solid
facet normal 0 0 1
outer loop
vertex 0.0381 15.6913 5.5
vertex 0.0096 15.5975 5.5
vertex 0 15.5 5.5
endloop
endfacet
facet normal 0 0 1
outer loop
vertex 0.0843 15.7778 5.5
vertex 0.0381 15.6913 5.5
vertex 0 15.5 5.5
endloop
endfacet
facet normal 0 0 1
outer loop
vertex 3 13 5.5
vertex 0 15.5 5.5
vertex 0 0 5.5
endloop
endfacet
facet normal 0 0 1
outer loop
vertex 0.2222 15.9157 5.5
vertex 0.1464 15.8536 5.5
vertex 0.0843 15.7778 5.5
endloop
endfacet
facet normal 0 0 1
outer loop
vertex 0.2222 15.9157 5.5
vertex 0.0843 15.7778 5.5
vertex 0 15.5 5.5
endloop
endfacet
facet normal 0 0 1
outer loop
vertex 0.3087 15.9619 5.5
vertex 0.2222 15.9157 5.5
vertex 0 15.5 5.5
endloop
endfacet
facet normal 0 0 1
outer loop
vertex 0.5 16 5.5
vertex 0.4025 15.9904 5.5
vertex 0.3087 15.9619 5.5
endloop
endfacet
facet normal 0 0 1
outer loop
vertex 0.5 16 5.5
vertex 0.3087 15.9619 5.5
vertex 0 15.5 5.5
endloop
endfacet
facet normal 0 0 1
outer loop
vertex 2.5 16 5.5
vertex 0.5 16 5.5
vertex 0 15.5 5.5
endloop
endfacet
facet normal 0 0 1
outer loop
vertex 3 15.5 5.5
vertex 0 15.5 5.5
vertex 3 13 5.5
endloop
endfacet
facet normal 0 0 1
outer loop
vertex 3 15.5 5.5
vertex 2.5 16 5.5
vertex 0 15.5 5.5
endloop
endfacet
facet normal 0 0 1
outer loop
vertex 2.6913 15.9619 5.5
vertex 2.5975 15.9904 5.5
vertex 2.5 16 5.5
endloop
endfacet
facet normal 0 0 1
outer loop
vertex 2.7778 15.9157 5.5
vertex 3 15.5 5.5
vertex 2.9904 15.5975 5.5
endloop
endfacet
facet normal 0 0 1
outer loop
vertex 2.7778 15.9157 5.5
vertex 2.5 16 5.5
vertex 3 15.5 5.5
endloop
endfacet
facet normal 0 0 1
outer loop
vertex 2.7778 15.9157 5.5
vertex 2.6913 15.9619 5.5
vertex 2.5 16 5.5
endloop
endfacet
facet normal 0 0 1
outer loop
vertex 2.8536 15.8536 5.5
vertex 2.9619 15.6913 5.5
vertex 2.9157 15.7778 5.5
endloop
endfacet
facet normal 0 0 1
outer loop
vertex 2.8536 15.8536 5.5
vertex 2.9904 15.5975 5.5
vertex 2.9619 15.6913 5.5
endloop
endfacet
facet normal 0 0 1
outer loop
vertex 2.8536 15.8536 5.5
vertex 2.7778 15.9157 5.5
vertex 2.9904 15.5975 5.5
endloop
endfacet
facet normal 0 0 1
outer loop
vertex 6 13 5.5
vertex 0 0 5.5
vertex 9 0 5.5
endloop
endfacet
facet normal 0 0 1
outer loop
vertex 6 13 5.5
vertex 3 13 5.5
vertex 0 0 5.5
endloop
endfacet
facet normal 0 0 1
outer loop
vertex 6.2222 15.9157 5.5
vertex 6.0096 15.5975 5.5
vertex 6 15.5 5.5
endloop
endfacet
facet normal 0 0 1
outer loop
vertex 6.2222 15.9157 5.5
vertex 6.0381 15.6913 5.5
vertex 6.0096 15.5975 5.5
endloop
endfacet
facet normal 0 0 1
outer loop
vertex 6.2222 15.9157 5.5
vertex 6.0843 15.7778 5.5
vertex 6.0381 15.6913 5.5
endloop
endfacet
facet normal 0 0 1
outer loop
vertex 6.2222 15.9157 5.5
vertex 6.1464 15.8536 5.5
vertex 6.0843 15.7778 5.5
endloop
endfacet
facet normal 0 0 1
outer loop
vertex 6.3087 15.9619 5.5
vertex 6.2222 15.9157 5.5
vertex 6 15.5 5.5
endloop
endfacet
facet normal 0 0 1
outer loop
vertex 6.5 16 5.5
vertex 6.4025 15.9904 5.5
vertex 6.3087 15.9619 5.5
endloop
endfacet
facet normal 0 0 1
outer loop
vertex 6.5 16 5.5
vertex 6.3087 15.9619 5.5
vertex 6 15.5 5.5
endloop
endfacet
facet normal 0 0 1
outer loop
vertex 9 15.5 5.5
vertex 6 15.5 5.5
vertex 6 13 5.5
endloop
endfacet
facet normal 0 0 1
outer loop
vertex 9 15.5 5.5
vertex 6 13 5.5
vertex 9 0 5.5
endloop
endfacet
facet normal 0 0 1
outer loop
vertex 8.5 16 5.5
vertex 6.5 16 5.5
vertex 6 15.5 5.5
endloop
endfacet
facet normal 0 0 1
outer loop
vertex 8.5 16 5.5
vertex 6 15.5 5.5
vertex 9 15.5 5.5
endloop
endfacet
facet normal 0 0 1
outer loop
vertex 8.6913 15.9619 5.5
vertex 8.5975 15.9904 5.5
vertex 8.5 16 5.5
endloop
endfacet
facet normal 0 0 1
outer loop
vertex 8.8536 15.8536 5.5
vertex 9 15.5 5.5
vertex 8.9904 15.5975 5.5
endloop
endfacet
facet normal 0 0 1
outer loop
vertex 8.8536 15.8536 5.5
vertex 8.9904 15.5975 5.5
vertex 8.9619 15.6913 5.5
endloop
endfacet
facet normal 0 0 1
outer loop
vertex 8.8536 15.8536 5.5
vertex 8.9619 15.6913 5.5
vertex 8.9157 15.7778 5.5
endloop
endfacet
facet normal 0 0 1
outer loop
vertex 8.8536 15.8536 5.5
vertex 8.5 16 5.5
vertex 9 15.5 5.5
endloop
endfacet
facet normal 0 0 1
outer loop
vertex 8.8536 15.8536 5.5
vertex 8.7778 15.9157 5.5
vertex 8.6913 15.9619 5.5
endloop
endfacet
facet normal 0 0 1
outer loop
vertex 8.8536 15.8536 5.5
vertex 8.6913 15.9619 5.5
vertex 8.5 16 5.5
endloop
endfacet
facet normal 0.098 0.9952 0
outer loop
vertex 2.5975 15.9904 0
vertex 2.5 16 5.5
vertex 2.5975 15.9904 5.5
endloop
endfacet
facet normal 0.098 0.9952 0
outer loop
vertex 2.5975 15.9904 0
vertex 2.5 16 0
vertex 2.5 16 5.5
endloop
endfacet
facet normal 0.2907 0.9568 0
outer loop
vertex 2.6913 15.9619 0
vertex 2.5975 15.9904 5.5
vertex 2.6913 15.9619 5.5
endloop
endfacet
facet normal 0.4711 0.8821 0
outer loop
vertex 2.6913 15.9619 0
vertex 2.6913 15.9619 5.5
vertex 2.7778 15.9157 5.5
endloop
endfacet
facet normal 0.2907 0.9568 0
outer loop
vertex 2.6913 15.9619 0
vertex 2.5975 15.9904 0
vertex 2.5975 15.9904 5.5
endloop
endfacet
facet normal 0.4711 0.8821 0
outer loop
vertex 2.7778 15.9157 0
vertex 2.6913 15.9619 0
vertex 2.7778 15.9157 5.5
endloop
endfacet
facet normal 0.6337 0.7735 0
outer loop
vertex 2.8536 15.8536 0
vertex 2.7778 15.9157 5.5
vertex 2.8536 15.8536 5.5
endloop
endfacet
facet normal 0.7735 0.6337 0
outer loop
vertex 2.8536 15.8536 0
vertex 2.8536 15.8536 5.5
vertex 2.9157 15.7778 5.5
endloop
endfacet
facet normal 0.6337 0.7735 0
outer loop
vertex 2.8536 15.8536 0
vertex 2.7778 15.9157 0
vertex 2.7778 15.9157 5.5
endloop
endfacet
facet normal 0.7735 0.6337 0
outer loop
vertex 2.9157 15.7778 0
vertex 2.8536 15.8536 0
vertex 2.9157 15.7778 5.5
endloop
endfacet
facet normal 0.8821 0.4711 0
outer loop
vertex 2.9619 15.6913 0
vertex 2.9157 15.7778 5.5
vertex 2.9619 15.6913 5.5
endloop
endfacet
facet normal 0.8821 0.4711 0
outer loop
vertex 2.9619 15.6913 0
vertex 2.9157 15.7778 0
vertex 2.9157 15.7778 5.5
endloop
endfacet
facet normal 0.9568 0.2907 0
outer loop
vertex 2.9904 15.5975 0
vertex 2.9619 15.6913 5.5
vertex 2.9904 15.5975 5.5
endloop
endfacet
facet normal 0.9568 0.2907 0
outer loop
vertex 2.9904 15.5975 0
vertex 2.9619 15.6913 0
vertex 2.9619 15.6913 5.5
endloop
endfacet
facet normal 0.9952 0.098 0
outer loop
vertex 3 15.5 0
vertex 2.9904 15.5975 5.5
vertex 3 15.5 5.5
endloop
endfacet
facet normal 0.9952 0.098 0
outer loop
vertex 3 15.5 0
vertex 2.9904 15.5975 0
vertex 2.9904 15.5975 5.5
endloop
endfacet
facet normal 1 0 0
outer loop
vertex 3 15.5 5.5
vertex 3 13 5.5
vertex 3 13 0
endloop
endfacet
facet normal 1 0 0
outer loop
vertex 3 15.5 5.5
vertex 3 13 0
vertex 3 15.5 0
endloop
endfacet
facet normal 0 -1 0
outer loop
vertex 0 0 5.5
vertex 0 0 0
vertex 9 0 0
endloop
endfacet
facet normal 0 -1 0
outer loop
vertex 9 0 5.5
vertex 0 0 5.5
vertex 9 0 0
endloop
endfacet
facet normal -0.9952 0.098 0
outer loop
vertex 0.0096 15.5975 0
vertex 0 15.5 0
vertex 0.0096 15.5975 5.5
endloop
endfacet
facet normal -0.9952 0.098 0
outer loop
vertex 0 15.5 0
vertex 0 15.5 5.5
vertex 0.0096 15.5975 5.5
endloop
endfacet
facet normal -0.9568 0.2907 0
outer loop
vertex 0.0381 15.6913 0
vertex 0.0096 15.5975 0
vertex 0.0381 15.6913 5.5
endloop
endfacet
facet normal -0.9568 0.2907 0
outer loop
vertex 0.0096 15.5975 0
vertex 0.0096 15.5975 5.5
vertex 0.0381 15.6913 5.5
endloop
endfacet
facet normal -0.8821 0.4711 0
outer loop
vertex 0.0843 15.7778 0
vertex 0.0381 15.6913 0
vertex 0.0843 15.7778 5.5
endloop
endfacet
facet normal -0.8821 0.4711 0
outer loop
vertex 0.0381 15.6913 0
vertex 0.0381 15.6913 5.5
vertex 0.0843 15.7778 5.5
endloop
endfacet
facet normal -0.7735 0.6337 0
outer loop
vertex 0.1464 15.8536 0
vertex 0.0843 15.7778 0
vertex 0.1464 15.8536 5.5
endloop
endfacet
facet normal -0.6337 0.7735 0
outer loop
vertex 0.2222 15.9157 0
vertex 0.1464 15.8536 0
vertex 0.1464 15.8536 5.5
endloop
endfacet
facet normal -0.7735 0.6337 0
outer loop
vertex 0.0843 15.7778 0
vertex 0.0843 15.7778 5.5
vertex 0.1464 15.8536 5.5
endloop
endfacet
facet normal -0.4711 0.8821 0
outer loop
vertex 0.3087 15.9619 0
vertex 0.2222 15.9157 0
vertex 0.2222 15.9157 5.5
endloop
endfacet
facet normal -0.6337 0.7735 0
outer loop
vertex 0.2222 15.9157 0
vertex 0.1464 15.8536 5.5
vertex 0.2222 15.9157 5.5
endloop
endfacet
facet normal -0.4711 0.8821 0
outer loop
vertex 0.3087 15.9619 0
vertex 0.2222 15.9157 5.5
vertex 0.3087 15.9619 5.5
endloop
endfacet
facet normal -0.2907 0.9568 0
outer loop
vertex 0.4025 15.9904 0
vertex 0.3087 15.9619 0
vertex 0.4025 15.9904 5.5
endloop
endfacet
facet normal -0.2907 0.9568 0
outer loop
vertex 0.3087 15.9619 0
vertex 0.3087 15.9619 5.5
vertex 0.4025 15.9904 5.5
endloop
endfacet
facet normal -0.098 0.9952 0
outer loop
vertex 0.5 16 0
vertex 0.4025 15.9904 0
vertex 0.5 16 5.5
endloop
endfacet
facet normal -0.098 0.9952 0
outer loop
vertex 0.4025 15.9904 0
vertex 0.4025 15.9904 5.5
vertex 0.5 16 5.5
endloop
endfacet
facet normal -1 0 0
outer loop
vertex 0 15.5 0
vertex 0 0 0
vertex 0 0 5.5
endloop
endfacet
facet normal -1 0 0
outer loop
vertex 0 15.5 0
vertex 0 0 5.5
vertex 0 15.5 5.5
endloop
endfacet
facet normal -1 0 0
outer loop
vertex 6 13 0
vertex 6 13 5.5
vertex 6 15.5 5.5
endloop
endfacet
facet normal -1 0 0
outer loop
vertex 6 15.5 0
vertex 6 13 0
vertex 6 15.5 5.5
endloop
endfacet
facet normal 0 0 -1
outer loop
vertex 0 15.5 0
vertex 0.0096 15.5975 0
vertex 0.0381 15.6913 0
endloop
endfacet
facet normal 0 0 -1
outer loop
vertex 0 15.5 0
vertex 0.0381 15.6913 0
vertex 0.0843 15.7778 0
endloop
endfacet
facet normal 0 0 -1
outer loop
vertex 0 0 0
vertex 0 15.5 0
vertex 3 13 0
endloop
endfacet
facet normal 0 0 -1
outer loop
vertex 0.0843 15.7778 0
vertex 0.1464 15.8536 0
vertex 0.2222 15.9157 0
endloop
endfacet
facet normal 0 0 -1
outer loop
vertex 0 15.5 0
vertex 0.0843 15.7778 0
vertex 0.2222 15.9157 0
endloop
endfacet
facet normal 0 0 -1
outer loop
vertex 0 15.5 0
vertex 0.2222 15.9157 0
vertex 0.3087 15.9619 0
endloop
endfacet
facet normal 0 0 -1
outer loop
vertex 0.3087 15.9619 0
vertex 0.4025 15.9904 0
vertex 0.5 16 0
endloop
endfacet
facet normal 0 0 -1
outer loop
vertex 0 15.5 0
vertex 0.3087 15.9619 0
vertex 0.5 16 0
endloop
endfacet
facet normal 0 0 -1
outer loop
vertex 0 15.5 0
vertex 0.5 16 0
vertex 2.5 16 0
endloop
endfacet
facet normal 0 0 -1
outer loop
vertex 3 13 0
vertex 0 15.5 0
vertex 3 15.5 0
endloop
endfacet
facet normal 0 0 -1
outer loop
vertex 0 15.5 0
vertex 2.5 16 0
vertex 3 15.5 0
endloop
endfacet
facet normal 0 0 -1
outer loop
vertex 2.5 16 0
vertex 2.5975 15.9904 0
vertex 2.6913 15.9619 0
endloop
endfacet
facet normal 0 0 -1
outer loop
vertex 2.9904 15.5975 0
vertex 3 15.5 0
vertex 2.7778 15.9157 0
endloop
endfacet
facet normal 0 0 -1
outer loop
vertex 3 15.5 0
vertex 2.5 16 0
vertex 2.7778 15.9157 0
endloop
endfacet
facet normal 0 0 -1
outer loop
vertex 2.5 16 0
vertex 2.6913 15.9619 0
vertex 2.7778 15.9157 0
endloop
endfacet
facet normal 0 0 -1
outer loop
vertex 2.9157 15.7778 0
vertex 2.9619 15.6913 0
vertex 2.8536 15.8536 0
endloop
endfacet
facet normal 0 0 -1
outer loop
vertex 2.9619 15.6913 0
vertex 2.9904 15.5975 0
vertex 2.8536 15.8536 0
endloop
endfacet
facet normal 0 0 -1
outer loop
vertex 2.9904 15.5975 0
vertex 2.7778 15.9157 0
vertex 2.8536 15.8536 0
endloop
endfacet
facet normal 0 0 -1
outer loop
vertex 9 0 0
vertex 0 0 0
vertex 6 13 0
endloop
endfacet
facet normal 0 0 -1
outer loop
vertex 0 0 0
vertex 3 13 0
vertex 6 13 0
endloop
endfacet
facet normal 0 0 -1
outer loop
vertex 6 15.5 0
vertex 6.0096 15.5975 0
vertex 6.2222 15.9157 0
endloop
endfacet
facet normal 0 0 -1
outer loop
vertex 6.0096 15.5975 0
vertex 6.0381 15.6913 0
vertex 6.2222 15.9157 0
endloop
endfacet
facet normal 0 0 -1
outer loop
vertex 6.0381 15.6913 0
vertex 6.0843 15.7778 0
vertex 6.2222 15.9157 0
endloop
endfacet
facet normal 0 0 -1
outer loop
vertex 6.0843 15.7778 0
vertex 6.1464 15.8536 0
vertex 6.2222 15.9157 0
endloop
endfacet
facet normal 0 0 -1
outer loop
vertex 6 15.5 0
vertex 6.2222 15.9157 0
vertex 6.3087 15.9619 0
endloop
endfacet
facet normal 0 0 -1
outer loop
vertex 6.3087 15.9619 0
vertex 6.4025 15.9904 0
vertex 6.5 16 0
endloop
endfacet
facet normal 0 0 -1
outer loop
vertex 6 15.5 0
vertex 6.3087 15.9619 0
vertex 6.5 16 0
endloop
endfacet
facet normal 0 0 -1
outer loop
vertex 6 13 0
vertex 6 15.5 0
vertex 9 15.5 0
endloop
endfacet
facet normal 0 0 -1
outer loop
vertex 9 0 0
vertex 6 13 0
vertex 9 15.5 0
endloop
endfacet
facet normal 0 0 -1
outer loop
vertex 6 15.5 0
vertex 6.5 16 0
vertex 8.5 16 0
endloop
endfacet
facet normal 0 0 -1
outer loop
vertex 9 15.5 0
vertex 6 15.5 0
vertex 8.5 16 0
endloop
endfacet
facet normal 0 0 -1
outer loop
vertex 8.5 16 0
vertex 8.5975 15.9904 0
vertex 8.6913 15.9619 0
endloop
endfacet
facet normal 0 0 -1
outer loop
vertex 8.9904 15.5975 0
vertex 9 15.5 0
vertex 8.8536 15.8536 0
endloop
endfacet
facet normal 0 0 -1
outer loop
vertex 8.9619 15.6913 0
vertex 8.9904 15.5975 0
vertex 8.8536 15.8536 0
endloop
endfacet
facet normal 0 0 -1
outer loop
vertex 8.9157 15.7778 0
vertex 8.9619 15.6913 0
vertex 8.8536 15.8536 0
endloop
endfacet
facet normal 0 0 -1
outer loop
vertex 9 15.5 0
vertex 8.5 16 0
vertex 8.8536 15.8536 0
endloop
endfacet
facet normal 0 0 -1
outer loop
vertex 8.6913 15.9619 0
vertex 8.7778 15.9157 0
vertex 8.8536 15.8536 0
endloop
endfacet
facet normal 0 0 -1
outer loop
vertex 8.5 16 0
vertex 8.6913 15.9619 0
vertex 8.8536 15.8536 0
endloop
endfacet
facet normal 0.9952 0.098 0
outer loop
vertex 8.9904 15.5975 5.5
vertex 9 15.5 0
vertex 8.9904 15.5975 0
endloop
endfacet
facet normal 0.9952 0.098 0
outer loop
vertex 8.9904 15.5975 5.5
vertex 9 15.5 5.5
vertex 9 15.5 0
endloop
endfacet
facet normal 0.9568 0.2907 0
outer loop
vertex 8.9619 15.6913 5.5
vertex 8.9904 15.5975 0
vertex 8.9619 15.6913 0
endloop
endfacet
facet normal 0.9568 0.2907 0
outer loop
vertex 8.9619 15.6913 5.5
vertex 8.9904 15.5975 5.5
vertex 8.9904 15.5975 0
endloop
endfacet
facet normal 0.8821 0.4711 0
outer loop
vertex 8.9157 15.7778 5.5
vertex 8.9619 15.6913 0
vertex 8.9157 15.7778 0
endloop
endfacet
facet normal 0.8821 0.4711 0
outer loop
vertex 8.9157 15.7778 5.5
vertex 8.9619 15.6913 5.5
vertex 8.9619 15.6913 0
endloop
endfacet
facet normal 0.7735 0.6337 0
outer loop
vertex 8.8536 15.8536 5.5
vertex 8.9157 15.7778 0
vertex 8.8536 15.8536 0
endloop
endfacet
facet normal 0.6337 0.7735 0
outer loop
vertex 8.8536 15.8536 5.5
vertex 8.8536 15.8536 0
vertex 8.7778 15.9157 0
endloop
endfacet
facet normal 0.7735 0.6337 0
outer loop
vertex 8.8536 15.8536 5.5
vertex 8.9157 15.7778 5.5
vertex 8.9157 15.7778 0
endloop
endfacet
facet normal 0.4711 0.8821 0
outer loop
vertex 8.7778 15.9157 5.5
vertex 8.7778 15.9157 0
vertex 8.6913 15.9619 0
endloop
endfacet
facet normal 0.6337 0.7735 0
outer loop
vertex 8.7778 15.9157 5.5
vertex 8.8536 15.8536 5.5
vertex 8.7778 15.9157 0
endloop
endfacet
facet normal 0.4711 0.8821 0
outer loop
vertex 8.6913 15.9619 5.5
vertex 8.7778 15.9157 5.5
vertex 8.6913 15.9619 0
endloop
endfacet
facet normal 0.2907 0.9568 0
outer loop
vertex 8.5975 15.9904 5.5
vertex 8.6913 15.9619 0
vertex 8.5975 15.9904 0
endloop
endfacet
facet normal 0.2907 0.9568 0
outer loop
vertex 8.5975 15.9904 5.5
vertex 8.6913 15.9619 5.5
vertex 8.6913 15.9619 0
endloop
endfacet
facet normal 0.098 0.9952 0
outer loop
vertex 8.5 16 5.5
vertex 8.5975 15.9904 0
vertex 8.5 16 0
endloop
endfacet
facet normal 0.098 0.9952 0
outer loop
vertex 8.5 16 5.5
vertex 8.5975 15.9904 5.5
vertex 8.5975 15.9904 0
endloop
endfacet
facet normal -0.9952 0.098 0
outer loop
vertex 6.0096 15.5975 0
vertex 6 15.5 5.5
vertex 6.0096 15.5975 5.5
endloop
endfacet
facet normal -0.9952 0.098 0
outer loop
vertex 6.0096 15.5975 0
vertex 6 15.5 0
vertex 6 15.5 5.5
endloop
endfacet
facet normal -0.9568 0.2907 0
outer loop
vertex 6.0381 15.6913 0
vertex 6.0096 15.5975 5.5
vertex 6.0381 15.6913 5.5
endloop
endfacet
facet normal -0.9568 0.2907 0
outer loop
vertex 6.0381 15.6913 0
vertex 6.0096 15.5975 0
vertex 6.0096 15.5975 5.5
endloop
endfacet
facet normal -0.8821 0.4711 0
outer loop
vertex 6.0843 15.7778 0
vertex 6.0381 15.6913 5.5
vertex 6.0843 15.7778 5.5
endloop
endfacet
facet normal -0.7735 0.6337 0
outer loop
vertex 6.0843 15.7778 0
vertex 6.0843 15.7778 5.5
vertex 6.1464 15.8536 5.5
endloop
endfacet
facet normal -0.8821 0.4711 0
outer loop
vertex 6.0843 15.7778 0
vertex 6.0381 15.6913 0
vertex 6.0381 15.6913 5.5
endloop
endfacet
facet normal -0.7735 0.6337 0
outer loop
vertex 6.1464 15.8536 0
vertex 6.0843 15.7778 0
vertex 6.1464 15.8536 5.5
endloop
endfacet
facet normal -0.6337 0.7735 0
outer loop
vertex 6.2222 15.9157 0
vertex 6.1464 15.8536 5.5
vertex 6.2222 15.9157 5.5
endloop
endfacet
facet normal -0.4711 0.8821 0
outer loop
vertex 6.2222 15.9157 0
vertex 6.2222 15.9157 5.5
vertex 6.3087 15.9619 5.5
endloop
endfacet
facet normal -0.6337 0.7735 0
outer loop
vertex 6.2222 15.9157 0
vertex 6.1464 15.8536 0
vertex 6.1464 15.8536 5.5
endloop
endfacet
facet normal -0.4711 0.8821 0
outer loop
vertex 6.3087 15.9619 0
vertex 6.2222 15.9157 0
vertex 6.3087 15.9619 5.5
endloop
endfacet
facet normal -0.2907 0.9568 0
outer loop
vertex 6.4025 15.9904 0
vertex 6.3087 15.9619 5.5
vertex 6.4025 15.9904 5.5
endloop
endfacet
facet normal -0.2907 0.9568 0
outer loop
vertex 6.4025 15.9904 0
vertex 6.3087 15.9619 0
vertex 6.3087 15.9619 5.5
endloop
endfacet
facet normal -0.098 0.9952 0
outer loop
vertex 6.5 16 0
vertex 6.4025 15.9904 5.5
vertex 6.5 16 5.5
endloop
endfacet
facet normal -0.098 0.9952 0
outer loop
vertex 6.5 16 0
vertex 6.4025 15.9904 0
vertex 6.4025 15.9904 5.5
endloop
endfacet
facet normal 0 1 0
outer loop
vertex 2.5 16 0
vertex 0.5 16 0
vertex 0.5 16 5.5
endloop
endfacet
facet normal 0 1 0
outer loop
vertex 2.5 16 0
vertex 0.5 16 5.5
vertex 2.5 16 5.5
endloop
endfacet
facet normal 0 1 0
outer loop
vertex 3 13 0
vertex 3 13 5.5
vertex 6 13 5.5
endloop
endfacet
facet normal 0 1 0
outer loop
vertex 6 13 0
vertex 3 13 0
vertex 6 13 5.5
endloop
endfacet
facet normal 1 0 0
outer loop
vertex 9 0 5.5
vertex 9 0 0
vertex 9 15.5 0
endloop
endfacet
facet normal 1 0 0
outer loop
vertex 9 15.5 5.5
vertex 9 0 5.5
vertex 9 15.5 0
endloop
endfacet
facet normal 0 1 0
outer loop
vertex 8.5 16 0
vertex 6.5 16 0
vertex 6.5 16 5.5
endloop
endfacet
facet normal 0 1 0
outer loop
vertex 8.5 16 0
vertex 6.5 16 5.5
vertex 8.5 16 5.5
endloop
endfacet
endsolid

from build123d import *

# Parameters (mm, degrees)
SKETCH_1_W          = 9
SKETCH_1_H          = 16
EXTRUDE_1_DEPTH     = 5.5
SKETCH_2_W          = 3
SKETCH_2_H          = 3
CUT_EXTRUDE_1_DEPTH = 20.163767897
FILLET_1_R          = 0.5


with BuildPart() as part:
    # ｽｹｯﾁ1 → ﾎﾞｽ - 押し出し1 (new body)
    with BuildSketch(Plane.XY):
        with Locations((4.5, 8)):
            Rectangle(SKETCH_1_W, SKETCH_1_H)
    extrude(amount=EXTRUDE_1_DEPTH)

    # ｽｹｯﾁ2 → ｶｯﾄ - 押し出し1 (cut, through all)
    with BuildSketch(Plane.XY.offset(5.5)):
        with Locations((4.5, 14.5)):
            Rectangle(SKETCH_2_W, SKETCH_2_H)
    extrude(amount=-CUT_EXTRUDE_1_DEPTH, mode=Mode.SUBTRACT)

    # ﾌｨﾚｯﾄ1
    fillet_1_edges = [part.edges().sort_by_distance(p)[0] for p in [
        (3, 16, 2.75),
        (6, 16, 2.75),
        (0, 16, 2.75),
        (9, 16, 2.75),
    ]]
    fillet(fillet_1_edges, radius=FILLET_1_R)


solid = part.part
